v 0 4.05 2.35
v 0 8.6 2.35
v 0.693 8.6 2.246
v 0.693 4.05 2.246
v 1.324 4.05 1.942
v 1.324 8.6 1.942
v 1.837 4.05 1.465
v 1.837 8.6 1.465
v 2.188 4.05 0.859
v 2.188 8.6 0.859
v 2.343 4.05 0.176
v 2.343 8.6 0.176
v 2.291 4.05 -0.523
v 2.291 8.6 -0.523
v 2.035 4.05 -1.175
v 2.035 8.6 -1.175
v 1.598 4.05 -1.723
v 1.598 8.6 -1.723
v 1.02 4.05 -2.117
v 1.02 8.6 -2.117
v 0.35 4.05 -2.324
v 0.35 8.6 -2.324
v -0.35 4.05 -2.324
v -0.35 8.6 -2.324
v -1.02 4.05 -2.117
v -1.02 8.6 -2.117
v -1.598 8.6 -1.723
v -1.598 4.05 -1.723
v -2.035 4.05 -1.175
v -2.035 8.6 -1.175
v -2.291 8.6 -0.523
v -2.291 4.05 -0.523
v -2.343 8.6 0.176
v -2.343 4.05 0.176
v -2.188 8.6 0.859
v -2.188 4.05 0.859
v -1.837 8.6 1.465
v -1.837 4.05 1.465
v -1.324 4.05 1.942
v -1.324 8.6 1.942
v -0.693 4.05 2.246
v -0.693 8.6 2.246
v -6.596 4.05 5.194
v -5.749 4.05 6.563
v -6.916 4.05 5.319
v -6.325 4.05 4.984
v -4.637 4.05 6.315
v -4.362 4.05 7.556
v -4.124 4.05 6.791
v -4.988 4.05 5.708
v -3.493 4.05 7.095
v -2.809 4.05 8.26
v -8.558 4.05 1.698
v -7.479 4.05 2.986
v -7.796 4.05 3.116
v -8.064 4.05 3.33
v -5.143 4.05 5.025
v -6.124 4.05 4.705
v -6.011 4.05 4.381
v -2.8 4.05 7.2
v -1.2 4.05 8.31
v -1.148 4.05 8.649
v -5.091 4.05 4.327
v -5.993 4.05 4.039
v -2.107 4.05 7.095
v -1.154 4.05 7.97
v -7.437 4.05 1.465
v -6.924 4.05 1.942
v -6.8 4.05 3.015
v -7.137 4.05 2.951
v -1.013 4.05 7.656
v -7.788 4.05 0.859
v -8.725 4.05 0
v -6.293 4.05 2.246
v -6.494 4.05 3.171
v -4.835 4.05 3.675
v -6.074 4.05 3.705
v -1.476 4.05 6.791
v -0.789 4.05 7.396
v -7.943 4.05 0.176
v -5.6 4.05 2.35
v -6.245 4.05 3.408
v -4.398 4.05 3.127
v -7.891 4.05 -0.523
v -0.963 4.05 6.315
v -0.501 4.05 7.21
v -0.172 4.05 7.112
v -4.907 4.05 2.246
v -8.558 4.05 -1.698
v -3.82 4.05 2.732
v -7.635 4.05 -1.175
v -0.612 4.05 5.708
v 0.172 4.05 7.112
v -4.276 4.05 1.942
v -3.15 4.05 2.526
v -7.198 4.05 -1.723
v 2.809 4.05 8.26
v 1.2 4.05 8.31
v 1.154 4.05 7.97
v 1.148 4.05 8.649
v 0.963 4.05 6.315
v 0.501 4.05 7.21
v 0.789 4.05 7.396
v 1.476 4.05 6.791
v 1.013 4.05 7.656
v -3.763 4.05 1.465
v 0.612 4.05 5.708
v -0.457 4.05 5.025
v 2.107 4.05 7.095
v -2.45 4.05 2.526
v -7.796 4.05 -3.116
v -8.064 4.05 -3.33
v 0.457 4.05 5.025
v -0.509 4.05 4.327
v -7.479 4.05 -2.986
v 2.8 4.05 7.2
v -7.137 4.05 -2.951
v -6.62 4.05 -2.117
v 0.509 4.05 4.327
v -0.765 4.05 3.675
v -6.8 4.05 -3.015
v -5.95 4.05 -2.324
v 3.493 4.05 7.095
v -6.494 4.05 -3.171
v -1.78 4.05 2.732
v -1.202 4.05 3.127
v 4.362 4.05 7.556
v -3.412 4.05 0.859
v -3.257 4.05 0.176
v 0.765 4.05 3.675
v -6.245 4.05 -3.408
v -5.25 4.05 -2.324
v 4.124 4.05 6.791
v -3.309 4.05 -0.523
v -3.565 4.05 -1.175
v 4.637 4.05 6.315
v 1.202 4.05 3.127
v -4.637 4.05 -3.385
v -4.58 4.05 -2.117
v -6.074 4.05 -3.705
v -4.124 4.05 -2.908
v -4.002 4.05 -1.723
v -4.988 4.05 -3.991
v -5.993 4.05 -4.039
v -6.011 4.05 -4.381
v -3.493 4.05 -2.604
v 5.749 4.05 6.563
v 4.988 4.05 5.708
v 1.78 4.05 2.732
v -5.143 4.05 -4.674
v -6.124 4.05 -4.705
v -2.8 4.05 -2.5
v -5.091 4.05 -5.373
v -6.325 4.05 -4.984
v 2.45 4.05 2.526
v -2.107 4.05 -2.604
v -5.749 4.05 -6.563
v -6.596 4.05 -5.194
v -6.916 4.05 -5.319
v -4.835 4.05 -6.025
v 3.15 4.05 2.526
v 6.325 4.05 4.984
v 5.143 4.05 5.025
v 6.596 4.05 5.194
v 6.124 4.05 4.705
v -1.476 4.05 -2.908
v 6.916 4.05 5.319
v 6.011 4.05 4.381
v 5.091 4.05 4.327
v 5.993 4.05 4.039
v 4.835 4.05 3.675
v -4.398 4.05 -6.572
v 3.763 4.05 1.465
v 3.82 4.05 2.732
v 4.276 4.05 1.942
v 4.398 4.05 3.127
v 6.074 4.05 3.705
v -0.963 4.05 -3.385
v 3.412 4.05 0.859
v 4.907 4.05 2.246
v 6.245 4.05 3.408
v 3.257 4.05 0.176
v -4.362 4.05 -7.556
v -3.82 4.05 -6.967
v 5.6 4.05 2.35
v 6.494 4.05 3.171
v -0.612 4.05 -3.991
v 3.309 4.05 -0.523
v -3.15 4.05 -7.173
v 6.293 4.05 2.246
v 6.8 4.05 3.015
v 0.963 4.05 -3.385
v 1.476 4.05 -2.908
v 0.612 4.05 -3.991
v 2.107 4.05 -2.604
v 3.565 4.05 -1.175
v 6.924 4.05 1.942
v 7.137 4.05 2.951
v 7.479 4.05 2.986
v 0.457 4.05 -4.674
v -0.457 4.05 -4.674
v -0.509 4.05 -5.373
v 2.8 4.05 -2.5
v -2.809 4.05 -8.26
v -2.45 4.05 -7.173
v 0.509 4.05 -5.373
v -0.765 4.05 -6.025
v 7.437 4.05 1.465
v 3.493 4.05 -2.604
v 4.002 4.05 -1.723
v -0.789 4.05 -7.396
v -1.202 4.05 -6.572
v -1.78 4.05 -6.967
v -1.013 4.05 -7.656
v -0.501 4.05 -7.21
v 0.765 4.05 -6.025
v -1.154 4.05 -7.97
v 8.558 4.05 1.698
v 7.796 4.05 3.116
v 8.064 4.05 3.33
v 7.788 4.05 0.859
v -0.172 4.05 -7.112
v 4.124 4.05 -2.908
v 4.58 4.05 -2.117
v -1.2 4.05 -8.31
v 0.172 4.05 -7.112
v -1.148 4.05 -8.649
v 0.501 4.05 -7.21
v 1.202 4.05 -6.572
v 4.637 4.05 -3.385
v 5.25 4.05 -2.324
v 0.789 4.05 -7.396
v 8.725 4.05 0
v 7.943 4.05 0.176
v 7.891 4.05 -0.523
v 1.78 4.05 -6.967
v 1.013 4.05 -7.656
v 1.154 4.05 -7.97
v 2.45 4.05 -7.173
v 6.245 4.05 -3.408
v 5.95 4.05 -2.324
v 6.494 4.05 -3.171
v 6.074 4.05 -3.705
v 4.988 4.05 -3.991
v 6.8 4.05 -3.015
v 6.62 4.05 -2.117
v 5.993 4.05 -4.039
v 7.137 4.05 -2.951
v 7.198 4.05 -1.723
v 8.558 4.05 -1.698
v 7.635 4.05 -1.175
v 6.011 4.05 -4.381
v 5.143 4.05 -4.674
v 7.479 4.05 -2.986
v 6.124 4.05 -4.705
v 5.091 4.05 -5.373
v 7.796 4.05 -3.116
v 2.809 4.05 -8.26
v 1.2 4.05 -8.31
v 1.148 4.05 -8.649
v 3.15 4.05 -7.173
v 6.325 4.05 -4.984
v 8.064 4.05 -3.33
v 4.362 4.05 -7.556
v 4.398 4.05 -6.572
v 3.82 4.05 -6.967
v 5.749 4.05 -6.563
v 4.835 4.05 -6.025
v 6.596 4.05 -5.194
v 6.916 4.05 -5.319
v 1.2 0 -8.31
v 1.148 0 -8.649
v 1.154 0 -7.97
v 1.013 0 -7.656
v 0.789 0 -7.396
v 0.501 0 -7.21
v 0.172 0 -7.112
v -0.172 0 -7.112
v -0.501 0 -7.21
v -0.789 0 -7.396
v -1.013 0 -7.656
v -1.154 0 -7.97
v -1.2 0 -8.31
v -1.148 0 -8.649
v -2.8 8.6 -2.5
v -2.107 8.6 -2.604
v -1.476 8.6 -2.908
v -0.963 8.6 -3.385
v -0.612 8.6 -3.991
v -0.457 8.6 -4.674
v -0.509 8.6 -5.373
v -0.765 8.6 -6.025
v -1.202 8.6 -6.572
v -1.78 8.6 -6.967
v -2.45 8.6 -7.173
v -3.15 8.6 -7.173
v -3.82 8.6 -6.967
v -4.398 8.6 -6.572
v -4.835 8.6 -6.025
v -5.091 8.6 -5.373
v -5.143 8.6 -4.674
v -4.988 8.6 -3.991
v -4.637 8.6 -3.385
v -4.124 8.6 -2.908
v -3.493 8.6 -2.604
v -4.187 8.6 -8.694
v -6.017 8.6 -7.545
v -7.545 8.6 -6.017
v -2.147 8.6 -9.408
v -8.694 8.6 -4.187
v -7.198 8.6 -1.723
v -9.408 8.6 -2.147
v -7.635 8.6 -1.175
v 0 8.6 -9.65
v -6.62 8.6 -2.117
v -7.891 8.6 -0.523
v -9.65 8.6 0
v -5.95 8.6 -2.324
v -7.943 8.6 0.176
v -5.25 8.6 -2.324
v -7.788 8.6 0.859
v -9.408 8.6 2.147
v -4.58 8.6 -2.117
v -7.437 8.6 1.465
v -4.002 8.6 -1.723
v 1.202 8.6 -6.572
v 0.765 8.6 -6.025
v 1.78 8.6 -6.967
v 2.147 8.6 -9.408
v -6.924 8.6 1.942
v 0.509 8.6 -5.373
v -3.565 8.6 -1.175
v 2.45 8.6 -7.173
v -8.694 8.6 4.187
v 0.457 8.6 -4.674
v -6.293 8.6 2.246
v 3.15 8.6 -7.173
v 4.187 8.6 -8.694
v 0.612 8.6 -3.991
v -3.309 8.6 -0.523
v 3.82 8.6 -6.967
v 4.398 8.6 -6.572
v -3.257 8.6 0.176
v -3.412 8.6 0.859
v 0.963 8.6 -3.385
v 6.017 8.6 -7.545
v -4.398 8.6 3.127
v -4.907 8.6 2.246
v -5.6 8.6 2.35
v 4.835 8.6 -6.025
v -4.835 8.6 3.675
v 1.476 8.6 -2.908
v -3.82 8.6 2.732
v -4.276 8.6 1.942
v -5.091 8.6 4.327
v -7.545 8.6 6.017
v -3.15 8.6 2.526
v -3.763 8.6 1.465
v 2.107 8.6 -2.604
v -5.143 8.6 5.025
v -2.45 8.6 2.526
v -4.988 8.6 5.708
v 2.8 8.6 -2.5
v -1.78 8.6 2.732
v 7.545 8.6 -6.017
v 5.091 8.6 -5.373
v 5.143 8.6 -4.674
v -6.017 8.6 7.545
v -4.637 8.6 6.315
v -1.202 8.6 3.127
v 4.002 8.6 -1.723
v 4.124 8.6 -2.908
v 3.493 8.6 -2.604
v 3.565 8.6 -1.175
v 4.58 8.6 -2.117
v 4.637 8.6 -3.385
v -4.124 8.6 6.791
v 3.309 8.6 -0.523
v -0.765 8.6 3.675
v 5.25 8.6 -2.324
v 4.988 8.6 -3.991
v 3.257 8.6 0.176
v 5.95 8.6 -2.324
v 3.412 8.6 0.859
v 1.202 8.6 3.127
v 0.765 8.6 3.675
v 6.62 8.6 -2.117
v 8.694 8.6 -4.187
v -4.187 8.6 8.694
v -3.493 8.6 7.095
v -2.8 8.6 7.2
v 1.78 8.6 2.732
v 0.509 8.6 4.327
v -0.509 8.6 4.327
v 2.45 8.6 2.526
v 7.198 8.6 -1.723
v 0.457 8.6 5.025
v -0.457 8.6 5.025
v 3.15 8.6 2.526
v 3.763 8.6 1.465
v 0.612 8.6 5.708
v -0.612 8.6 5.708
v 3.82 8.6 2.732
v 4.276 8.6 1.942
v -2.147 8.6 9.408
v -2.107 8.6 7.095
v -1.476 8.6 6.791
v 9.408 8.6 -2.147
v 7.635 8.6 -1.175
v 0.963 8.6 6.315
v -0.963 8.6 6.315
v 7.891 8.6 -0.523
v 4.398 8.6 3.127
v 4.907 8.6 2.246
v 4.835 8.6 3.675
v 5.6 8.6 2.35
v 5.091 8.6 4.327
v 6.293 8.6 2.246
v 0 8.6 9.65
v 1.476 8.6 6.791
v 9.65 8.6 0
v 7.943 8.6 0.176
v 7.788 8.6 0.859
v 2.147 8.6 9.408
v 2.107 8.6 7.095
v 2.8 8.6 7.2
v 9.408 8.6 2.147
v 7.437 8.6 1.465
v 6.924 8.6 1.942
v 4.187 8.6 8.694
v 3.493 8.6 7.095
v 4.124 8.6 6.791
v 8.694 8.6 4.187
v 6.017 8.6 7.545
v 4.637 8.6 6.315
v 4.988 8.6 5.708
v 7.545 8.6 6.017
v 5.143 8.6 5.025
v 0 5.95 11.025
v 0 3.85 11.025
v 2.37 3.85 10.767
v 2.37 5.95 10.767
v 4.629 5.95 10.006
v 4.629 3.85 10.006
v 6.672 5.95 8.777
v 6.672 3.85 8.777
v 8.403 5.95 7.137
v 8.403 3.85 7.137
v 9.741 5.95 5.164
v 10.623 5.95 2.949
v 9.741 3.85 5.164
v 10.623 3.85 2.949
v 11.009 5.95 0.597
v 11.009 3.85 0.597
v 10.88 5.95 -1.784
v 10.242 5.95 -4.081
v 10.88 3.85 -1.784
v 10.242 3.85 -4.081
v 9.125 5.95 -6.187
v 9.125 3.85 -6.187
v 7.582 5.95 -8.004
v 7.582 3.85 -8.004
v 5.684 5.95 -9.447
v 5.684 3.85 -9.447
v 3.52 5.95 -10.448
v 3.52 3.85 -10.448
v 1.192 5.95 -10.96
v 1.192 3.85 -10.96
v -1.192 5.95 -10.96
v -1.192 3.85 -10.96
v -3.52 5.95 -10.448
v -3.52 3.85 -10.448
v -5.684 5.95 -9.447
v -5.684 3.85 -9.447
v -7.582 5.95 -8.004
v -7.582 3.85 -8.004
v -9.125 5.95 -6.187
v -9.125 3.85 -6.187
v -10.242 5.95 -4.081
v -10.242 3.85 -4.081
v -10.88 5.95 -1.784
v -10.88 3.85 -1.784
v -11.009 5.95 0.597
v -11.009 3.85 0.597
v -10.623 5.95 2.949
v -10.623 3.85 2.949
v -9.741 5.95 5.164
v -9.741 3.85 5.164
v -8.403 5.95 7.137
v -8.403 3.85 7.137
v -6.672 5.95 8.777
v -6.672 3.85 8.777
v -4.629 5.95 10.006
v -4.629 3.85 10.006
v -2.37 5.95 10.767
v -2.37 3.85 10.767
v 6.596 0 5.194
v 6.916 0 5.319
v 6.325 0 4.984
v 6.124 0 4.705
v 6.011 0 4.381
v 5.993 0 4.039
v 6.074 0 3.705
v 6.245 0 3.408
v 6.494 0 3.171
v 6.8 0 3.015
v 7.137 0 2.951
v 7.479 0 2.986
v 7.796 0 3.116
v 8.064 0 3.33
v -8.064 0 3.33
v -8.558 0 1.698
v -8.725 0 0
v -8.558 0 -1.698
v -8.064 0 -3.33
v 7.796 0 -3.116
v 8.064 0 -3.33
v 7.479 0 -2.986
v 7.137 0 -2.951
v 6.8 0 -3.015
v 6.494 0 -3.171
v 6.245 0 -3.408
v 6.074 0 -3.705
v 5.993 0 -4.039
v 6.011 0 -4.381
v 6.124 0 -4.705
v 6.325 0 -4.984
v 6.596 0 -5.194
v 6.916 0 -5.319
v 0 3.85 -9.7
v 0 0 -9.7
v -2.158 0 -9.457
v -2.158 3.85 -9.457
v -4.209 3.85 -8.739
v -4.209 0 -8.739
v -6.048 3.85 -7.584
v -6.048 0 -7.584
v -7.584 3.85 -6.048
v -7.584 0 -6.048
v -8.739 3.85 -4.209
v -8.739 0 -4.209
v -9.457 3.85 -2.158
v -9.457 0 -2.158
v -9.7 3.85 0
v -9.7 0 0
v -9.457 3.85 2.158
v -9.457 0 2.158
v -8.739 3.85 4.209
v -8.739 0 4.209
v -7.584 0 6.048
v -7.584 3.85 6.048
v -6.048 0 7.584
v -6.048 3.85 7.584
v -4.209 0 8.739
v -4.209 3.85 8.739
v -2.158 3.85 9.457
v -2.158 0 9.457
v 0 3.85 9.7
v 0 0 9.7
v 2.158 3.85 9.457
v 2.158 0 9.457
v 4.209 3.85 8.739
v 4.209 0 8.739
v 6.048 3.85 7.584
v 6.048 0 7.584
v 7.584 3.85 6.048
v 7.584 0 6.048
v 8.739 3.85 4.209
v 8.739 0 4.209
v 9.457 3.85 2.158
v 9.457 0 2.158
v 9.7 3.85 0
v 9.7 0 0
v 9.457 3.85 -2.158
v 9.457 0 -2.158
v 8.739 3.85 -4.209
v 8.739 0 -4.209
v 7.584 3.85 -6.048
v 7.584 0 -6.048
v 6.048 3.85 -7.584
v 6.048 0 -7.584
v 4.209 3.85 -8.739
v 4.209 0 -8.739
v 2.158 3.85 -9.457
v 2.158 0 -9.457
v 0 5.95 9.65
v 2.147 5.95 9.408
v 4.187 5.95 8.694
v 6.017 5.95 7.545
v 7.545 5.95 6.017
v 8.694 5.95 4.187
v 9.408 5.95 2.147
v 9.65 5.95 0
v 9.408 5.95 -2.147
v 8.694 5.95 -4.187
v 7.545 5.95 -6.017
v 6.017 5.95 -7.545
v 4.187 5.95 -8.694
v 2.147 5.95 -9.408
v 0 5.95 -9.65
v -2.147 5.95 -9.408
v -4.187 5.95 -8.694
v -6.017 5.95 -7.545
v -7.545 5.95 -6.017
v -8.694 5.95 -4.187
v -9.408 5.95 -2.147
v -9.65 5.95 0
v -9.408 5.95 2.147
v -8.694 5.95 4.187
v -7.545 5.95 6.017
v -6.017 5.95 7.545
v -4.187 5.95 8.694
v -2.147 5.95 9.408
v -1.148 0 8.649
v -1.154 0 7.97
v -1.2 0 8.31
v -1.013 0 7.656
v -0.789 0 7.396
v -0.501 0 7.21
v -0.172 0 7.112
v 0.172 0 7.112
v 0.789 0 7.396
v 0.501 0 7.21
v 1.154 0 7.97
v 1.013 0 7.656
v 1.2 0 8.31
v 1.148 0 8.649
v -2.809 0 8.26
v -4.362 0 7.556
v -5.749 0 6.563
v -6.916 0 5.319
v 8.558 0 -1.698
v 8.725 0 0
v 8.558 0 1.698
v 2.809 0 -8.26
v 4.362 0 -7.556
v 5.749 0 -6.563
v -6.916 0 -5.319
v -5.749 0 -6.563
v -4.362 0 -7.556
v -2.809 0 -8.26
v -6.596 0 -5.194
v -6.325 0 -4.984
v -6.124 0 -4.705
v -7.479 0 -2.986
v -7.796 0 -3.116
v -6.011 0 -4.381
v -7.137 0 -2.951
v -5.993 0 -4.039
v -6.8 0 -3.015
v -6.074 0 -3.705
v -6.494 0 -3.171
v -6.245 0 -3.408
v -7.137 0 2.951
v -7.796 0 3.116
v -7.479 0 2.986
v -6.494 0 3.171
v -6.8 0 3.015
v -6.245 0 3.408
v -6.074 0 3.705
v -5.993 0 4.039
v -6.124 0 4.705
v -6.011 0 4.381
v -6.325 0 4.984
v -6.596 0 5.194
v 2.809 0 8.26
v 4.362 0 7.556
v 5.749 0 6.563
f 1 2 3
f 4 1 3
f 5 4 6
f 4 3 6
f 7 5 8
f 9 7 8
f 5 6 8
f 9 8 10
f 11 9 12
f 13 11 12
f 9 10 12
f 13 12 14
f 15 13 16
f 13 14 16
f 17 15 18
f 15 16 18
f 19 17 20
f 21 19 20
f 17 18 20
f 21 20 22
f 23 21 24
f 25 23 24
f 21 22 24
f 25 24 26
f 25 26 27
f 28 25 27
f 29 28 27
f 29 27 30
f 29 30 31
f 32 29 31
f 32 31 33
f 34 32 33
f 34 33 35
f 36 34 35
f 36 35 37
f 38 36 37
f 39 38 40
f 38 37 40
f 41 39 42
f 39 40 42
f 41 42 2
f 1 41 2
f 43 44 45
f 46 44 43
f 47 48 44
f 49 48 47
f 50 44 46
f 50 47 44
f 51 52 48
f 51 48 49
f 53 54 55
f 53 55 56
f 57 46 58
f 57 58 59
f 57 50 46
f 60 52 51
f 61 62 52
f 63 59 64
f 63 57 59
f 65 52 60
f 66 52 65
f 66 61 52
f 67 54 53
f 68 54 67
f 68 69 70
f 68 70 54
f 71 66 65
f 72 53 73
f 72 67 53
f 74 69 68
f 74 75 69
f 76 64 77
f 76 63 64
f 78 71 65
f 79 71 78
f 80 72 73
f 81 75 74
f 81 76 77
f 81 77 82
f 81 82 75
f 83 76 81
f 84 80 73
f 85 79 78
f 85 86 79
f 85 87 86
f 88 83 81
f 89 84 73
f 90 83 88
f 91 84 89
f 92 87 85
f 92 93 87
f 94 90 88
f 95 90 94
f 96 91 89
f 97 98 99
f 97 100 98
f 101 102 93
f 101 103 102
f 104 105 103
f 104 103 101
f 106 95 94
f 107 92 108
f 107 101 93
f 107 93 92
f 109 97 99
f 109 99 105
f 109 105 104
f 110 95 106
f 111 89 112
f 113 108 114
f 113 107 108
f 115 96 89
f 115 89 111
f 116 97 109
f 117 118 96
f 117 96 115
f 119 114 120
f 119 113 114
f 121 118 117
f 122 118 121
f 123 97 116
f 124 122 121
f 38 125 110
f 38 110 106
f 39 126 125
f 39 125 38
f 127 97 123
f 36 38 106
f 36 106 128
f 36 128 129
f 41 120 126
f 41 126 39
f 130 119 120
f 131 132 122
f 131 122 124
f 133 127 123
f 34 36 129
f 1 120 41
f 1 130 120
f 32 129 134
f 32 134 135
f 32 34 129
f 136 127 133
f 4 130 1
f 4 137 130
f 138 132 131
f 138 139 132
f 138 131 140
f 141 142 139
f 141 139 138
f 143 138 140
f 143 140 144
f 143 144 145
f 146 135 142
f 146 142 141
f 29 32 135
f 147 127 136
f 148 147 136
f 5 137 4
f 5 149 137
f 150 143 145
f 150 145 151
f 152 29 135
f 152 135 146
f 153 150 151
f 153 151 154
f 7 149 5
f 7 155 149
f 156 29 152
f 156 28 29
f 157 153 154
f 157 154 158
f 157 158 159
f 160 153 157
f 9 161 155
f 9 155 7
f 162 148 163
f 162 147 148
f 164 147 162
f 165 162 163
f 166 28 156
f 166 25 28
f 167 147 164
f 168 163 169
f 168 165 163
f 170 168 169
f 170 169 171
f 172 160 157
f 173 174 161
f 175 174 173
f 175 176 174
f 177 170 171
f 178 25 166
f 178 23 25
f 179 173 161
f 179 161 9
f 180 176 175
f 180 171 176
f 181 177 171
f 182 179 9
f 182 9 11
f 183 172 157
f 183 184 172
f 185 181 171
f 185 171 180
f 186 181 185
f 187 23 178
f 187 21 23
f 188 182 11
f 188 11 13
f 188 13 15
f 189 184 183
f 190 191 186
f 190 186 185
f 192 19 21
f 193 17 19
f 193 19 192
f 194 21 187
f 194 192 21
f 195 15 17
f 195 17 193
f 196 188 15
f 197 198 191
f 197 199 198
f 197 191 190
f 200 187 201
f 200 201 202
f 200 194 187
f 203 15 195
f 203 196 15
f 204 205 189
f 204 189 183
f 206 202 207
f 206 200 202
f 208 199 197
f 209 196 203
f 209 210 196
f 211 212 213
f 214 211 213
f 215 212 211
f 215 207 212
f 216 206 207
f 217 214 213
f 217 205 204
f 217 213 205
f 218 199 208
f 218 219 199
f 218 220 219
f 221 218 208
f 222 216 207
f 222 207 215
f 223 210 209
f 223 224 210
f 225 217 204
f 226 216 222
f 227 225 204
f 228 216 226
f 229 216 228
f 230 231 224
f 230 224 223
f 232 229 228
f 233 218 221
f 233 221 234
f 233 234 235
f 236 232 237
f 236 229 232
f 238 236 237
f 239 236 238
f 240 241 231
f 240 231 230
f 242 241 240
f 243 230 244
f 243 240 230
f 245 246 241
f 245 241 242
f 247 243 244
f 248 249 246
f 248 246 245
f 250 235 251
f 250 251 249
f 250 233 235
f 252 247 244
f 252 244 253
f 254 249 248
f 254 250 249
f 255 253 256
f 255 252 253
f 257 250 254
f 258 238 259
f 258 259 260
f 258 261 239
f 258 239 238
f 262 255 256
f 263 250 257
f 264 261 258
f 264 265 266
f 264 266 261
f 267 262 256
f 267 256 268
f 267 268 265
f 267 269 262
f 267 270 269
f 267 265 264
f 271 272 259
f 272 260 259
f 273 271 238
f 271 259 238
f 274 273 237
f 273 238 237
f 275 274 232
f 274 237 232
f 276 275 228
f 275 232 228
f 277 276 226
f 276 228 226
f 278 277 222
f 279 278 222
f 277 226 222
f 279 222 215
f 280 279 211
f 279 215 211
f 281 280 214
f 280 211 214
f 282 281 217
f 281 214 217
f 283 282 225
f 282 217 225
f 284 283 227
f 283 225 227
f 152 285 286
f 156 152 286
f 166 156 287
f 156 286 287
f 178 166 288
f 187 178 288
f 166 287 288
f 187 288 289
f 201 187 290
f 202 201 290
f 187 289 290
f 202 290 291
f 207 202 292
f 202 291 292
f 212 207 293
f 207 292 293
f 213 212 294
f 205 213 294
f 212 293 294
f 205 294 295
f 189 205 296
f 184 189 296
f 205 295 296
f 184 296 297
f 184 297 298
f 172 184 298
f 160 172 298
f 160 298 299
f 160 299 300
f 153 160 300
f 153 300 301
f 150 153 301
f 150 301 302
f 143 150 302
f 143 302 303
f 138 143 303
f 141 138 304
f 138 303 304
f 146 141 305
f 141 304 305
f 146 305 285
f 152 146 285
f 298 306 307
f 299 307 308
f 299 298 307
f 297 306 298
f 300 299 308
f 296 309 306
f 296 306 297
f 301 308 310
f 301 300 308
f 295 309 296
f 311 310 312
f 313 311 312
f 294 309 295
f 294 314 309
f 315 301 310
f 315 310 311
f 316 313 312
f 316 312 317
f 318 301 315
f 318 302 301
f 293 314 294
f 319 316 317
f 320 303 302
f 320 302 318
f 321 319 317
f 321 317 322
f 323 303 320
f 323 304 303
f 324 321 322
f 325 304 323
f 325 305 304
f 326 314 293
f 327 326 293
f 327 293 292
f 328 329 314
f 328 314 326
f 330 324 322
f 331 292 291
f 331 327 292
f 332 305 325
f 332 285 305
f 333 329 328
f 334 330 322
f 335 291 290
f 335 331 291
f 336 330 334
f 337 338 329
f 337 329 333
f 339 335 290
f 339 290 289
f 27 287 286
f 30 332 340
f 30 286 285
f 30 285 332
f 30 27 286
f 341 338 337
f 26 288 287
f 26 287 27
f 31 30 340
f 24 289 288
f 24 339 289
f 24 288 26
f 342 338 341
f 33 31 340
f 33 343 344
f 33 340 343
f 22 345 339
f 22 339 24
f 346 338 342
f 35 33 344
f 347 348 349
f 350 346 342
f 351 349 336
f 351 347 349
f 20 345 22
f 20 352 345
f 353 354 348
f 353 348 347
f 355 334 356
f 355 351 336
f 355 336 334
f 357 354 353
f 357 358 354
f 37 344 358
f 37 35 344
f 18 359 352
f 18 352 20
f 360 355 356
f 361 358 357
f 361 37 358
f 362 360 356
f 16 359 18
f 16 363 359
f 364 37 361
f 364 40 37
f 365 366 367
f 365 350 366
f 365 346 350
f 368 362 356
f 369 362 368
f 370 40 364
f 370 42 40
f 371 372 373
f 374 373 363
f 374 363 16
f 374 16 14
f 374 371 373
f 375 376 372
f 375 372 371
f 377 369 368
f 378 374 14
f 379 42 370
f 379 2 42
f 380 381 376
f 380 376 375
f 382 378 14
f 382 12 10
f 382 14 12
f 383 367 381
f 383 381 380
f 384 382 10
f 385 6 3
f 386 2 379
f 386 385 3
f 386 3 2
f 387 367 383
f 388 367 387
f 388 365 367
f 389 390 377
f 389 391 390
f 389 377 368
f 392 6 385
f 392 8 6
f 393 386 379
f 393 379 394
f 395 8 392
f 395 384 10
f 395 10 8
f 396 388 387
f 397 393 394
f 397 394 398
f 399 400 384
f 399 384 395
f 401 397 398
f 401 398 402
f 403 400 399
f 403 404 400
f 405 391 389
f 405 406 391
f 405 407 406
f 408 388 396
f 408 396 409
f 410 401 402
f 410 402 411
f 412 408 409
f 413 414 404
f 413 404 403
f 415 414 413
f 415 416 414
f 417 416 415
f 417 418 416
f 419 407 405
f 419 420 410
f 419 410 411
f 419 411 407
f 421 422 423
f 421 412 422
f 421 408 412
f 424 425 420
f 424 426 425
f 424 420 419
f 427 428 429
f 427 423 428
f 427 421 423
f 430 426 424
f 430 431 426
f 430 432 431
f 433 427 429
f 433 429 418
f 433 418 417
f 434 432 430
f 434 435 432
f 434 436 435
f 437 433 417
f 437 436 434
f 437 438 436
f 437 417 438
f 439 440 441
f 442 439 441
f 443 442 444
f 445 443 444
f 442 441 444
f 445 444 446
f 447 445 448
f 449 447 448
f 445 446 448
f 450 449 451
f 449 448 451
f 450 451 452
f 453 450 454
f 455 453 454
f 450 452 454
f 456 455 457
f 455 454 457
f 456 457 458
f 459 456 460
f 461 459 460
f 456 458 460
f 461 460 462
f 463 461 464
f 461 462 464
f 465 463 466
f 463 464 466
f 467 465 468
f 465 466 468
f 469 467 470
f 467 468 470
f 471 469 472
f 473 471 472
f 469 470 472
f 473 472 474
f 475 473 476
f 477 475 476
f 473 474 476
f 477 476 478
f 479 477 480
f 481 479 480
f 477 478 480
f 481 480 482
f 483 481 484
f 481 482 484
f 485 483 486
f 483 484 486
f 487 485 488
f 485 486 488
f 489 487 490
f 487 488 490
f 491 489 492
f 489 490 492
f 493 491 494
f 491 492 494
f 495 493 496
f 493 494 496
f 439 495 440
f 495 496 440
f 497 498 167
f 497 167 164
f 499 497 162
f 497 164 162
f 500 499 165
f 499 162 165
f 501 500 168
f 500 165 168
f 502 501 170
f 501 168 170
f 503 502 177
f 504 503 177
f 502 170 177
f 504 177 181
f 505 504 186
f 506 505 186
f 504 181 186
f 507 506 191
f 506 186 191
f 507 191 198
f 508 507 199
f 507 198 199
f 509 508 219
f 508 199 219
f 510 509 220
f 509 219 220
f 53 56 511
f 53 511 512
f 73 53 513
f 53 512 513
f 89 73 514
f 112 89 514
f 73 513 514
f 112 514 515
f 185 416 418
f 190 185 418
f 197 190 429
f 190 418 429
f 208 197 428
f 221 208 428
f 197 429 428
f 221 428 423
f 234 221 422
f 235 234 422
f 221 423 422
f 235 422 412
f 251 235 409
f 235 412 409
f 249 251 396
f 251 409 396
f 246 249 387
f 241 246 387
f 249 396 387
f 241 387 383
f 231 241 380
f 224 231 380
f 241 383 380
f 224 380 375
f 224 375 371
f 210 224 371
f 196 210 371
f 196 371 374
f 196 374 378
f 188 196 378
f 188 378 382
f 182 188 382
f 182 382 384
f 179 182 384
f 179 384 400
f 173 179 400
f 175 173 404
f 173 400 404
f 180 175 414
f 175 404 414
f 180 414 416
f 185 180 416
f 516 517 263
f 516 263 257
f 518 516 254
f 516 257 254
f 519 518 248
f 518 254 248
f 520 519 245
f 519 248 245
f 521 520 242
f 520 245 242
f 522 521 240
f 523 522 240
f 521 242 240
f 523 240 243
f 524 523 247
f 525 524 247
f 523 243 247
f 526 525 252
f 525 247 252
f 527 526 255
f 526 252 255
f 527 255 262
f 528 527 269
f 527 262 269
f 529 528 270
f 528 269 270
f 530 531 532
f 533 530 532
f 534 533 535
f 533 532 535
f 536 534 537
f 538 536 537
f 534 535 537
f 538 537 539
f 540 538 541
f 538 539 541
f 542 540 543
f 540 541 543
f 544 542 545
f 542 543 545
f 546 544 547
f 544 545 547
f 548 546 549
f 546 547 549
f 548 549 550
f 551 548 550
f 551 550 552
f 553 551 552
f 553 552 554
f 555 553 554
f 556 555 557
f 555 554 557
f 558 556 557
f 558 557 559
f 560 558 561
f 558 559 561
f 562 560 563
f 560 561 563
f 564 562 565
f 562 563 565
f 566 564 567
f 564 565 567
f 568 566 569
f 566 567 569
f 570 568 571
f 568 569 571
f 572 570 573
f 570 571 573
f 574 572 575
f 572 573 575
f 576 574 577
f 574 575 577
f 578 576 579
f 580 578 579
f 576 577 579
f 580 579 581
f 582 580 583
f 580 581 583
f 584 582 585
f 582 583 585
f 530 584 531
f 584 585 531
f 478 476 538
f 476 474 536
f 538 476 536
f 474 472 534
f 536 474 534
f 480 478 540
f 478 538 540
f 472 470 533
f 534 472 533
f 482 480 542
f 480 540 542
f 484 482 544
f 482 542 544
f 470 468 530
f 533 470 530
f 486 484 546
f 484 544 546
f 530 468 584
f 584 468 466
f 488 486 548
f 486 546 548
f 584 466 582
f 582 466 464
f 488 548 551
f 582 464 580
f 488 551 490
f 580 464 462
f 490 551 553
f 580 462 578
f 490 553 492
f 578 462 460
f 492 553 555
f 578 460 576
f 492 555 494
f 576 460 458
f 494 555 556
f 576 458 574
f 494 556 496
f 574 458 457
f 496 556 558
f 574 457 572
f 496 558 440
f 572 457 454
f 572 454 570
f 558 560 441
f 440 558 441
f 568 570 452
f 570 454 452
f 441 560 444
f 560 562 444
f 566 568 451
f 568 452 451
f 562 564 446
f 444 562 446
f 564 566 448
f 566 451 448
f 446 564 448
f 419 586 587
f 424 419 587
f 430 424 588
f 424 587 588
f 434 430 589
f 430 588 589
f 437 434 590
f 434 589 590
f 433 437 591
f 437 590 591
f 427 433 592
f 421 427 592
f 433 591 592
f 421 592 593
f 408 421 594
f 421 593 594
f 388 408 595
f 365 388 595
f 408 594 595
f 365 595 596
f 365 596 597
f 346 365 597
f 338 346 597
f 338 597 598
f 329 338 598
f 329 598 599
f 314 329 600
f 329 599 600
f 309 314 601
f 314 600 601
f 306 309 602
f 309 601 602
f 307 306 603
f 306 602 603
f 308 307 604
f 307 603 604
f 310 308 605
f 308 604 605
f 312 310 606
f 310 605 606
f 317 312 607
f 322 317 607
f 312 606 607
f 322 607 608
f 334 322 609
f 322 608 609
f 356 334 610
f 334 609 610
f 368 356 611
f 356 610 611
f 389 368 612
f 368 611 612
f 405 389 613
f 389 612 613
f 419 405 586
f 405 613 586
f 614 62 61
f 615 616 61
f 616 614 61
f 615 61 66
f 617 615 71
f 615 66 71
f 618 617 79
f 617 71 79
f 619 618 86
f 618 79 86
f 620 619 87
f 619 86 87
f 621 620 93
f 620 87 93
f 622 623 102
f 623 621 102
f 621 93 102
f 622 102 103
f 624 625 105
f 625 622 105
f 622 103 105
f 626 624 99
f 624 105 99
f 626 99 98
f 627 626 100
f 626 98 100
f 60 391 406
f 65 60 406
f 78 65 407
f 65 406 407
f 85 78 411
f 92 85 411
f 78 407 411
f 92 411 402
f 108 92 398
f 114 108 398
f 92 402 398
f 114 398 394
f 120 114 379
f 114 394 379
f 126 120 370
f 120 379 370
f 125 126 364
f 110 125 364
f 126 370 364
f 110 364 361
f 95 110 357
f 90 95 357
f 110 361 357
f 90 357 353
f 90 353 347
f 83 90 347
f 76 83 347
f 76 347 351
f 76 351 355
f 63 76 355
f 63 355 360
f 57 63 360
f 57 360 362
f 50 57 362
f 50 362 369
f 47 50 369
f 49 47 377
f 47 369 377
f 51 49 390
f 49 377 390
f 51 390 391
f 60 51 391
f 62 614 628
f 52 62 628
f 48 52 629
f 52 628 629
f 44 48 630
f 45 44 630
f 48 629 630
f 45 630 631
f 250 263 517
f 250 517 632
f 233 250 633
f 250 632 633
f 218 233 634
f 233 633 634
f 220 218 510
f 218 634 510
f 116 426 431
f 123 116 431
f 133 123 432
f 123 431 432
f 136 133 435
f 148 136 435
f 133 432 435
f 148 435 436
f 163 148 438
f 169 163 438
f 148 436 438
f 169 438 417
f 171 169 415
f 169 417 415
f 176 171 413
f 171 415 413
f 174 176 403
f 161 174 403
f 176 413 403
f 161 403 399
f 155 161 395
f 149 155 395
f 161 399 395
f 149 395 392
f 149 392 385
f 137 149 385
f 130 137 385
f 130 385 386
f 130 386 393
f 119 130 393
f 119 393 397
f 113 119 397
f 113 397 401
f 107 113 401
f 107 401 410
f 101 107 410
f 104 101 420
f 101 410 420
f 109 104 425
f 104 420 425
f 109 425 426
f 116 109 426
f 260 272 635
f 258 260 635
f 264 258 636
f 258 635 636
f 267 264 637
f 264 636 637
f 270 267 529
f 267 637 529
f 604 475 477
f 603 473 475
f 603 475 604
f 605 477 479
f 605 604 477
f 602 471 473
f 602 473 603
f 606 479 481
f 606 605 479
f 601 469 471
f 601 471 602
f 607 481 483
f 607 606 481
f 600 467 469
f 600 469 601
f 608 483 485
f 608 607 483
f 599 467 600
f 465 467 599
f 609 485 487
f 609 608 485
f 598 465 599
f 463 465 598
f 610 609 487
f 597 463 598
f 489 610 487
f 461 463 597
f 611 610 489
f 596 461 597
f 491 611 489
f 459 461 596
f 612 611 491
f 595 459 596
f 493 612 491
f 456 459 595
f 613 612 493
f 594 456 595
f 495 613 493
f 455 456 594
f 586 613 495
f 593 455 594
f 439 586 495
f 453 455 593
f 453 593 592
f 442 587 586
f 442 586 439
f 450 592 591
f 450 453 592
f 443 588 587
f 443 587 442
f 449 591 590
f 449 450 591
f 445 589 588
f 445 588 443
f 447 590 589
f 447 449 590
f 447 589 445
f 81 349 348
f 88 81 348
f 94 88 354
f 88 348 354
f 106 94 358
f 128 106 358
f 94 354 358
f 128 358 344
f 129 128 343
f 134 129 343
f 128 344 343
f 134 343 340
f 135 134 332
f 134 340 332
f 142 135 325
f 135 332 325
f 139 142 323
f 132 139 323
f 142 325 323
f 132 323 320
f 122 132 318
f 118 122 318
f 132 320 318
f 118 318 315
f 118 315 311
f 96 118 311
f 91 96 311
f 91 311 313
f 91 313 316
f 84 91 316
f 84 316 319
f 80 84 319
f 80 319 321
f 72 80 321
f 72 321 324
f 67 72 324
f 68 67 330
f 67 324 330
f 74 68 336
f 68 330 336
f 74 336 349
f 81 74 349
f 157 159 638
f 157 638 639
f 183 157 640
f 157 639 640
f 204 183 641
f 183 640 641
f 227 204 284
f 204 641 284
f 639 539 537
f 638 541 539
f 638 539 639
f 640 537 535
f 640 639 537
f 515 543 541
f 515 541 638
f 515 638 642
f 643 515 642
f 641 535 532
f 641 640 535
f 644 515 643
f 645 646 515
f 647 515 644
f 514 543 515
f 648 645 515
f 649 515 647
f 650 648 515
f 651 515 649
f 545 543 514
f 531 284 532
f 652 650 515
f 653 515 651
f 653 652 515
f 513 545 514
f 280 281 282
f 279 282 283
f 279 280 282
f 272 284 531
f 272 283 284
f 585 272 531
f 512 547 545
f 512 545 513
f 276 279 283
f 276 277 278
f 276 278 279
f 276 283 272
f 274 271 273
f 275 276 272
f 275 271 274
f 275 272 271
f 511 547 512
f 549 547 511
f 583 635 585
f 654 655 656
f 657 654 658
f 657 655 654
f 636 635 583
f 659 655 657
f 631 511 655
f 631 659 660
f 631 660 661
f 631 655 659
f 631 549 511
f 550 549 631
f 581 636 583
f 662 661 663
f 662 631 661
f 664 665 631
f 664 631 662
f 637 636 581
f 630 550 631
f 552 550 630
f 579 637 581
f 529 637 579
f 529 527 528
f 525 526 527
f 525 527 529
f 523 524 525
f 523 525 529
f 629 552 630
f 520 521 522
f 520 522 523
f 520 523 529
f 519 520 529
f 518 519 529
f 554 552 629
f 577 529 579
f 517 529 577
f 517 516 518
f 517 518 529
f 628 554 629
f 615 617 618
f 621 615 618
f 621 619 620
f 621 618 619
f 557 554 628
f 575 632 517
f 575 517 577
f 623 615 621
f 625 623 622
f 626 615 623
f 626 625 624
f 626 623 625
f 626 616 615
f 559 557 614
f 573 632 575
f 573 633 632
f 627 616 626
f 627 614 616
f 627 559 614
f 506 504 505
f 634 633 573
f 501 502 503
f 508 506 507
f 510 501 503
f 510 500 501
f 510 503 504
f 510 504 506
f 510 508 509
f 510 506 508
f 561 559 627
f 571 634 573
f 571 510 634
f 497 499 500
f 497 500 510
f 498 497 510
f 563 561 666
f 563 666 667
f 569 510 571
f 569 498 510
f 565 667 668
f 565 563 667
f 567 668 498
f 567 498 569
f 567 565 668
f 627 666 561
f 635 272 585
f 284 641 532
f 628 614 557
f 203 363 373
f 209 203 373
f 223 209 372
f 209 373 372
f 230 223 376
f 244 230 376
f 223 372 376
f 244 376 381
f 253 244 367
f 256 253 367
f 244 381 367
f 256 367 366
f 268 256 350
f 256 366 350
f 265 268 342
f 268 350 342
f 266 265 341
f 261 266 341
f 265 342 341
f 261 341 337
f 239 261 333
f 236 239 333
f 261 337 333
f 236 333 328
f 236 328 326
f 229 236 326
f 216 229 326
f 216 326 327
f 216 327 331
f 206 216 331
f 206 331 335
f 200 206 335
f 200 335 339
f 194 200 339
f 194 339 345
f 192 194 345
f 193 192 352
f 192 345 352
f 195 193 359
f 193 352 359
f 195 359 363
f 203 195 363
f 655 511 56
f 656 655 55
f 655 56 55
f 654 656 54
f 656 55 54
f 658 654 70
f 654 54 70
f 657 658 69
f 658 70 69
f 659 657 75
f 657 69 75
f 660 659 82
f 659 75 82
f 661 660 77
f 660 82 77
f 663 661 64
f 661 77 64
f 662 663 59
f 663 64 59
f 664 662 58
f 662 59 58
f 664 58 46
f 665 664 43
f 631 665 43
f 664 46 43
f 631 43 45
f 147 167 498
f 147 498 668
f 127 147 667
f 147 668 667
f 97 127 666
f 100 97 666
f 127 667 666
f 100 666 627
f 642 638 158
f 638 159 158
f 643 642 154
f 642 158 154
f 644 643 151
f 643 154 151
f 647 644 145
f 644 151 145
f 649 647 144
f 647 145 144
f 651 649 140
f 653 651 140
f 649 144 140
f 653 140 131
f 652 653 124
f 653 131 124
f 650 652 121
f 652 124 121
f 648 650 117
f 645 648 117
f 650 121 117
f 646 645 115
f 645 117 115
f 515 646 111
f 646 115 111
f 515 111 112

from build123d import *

# Parameters (mm, degrees)
CROQUIS4_R              = 9.7
SALIENTE_EXTRUIR2_DEPTH = 3.85
CROQUIS5_R              = 11.025
SALIENTE_EXTRUIR3_DEPTH = 2.1
CROQUIS6_R              = 9.65
SALIENTE_EXTRUIR4_DEPTH = 2.65
CROQUIS8_R              = 8.725
CORTAR_EXTRUIR2_DEPTH   = 4.05
CROQUIS9_R              = 2.35
CORTAR_EXTRUIR3_DEPTH   = 4.55
CROQUIS10_R             = 1.2
SALIENTE_EXTRUIR5_DEPTH = 4.05


with BuildPart() as part:
    # Croquis4 → Saliente-Extruir2 (new body)
    with BuildSketch(Plane(origin=(0, 0, 0), x_dir=(1, 0, 0), z_dir=(0, 1, 0))):
        with Locations(Location((0, 0, 0), (0, 0, 90))):
            Circle(CROQUIS4_R)
    extrude(amount=SALIENTE_EXTRUIR2_DEPTH)

    # Croquis5 → Saliente-Extruir3 (add)
    with BuildSketch(Plane(origin=(0, 3.85, 0), x_dir=(1, 0, 0), z_dir=(0, 1, 0))):
        with Locations(Location((0, 0, 0), (0, 0, 270))):
            Circle(CROQUIS5_R)
    extrude(amount=SALIENTE_EXTRUIR3_DEPTH)

    # Croquis6 → Saliente-Extruir4 (add)
    with BuildSketch(Plane(origin=(0, 5.95, 0), x_dir=(1, 0, 0), z_dir=(0, 1, 0))):
        with Locations(Location((0, 0, 0), (0, 0, 270))):
            Circle(CROQUIS6_R)
    extrude(amount=SALIENTE_EXTRUIR4_DEPTH)

    # Croquis8 → Cortar-Extruir2 (cut)
    with BuildSketch(Plane.XZ):
        with Locations(Location((0, 0, 0), (0, 0, 270))):
            Circle(CROQUIS8_R)
    extrude(amount=-CORTAR_EXTRUIR2_DEPTH, mode=Mode.SUBTRACT)

    # Croquis9 → Cortar-Extruir3 (cut)
    with BuildSketch(Plane(origin=(0, 8.6, 0), x_dir=(1, 0, 0), z_dir=(0, 1, 0))):
        with Locations(Location((-2.8, 4.849742261, 0), (0, 0, 270))):
            Circle(CROQUIS9_R)
        with Locations(Location((5.6, 0, 0), (0, 0, 270))):
            Circle(CROQUIS9_R)
        with Locations(Location((0, 0, 0), (0, 0, 270))):
            Circle(CROQUIS9_R)
        with Locations(Location((2.8, 4.849742261, 0), (0, 0, 270))):
            Circle(CROQUIS9_R)
        with Locations(Location((2.8, -4.849742261, 0), (0, 0, 270))):
            Circle(CROQUIS9_R)
        with Locations(Location((-2.800010296, -4.849760094, 0), (0, 0, 270))):
            Circle(CROQUIS9_R)
        with Locations(Location((-5.6, 0, 0), (0, 0, 270))):
            Circle(CROQUIS9_R)
    extrude(amount=-CORTAR_EXTRUIR3_DEPTH, mode=Mode.SUBTRACT)

    # Croquis10 → Saliente-Extruir5 (add)
    with BuildSketch(Plane.XZ.offset(-4.05)):
        with Locations((0, 8.3)):
            Circle(CROQUIS10_R)
        with Locations((-7.188010851, 4.15)):
            Circle(CROQUIS10_R)
        with Locations((-7.188010851, -4.15)):
            Circle(CROQUIS10_R)
        with Locations((0, -8.3)):
            Circle(CROQUIS10_R)
        with Locations((7.188010851, -4.15)):
            Circle(CROQUIS10_R)
        with Locations((7.188010851, 4.15)):
            Circle(CROQUIS10_R)
    extrude(amount=SALIENTE_EXTRUIR5_DEPTH)


solid = part.part
